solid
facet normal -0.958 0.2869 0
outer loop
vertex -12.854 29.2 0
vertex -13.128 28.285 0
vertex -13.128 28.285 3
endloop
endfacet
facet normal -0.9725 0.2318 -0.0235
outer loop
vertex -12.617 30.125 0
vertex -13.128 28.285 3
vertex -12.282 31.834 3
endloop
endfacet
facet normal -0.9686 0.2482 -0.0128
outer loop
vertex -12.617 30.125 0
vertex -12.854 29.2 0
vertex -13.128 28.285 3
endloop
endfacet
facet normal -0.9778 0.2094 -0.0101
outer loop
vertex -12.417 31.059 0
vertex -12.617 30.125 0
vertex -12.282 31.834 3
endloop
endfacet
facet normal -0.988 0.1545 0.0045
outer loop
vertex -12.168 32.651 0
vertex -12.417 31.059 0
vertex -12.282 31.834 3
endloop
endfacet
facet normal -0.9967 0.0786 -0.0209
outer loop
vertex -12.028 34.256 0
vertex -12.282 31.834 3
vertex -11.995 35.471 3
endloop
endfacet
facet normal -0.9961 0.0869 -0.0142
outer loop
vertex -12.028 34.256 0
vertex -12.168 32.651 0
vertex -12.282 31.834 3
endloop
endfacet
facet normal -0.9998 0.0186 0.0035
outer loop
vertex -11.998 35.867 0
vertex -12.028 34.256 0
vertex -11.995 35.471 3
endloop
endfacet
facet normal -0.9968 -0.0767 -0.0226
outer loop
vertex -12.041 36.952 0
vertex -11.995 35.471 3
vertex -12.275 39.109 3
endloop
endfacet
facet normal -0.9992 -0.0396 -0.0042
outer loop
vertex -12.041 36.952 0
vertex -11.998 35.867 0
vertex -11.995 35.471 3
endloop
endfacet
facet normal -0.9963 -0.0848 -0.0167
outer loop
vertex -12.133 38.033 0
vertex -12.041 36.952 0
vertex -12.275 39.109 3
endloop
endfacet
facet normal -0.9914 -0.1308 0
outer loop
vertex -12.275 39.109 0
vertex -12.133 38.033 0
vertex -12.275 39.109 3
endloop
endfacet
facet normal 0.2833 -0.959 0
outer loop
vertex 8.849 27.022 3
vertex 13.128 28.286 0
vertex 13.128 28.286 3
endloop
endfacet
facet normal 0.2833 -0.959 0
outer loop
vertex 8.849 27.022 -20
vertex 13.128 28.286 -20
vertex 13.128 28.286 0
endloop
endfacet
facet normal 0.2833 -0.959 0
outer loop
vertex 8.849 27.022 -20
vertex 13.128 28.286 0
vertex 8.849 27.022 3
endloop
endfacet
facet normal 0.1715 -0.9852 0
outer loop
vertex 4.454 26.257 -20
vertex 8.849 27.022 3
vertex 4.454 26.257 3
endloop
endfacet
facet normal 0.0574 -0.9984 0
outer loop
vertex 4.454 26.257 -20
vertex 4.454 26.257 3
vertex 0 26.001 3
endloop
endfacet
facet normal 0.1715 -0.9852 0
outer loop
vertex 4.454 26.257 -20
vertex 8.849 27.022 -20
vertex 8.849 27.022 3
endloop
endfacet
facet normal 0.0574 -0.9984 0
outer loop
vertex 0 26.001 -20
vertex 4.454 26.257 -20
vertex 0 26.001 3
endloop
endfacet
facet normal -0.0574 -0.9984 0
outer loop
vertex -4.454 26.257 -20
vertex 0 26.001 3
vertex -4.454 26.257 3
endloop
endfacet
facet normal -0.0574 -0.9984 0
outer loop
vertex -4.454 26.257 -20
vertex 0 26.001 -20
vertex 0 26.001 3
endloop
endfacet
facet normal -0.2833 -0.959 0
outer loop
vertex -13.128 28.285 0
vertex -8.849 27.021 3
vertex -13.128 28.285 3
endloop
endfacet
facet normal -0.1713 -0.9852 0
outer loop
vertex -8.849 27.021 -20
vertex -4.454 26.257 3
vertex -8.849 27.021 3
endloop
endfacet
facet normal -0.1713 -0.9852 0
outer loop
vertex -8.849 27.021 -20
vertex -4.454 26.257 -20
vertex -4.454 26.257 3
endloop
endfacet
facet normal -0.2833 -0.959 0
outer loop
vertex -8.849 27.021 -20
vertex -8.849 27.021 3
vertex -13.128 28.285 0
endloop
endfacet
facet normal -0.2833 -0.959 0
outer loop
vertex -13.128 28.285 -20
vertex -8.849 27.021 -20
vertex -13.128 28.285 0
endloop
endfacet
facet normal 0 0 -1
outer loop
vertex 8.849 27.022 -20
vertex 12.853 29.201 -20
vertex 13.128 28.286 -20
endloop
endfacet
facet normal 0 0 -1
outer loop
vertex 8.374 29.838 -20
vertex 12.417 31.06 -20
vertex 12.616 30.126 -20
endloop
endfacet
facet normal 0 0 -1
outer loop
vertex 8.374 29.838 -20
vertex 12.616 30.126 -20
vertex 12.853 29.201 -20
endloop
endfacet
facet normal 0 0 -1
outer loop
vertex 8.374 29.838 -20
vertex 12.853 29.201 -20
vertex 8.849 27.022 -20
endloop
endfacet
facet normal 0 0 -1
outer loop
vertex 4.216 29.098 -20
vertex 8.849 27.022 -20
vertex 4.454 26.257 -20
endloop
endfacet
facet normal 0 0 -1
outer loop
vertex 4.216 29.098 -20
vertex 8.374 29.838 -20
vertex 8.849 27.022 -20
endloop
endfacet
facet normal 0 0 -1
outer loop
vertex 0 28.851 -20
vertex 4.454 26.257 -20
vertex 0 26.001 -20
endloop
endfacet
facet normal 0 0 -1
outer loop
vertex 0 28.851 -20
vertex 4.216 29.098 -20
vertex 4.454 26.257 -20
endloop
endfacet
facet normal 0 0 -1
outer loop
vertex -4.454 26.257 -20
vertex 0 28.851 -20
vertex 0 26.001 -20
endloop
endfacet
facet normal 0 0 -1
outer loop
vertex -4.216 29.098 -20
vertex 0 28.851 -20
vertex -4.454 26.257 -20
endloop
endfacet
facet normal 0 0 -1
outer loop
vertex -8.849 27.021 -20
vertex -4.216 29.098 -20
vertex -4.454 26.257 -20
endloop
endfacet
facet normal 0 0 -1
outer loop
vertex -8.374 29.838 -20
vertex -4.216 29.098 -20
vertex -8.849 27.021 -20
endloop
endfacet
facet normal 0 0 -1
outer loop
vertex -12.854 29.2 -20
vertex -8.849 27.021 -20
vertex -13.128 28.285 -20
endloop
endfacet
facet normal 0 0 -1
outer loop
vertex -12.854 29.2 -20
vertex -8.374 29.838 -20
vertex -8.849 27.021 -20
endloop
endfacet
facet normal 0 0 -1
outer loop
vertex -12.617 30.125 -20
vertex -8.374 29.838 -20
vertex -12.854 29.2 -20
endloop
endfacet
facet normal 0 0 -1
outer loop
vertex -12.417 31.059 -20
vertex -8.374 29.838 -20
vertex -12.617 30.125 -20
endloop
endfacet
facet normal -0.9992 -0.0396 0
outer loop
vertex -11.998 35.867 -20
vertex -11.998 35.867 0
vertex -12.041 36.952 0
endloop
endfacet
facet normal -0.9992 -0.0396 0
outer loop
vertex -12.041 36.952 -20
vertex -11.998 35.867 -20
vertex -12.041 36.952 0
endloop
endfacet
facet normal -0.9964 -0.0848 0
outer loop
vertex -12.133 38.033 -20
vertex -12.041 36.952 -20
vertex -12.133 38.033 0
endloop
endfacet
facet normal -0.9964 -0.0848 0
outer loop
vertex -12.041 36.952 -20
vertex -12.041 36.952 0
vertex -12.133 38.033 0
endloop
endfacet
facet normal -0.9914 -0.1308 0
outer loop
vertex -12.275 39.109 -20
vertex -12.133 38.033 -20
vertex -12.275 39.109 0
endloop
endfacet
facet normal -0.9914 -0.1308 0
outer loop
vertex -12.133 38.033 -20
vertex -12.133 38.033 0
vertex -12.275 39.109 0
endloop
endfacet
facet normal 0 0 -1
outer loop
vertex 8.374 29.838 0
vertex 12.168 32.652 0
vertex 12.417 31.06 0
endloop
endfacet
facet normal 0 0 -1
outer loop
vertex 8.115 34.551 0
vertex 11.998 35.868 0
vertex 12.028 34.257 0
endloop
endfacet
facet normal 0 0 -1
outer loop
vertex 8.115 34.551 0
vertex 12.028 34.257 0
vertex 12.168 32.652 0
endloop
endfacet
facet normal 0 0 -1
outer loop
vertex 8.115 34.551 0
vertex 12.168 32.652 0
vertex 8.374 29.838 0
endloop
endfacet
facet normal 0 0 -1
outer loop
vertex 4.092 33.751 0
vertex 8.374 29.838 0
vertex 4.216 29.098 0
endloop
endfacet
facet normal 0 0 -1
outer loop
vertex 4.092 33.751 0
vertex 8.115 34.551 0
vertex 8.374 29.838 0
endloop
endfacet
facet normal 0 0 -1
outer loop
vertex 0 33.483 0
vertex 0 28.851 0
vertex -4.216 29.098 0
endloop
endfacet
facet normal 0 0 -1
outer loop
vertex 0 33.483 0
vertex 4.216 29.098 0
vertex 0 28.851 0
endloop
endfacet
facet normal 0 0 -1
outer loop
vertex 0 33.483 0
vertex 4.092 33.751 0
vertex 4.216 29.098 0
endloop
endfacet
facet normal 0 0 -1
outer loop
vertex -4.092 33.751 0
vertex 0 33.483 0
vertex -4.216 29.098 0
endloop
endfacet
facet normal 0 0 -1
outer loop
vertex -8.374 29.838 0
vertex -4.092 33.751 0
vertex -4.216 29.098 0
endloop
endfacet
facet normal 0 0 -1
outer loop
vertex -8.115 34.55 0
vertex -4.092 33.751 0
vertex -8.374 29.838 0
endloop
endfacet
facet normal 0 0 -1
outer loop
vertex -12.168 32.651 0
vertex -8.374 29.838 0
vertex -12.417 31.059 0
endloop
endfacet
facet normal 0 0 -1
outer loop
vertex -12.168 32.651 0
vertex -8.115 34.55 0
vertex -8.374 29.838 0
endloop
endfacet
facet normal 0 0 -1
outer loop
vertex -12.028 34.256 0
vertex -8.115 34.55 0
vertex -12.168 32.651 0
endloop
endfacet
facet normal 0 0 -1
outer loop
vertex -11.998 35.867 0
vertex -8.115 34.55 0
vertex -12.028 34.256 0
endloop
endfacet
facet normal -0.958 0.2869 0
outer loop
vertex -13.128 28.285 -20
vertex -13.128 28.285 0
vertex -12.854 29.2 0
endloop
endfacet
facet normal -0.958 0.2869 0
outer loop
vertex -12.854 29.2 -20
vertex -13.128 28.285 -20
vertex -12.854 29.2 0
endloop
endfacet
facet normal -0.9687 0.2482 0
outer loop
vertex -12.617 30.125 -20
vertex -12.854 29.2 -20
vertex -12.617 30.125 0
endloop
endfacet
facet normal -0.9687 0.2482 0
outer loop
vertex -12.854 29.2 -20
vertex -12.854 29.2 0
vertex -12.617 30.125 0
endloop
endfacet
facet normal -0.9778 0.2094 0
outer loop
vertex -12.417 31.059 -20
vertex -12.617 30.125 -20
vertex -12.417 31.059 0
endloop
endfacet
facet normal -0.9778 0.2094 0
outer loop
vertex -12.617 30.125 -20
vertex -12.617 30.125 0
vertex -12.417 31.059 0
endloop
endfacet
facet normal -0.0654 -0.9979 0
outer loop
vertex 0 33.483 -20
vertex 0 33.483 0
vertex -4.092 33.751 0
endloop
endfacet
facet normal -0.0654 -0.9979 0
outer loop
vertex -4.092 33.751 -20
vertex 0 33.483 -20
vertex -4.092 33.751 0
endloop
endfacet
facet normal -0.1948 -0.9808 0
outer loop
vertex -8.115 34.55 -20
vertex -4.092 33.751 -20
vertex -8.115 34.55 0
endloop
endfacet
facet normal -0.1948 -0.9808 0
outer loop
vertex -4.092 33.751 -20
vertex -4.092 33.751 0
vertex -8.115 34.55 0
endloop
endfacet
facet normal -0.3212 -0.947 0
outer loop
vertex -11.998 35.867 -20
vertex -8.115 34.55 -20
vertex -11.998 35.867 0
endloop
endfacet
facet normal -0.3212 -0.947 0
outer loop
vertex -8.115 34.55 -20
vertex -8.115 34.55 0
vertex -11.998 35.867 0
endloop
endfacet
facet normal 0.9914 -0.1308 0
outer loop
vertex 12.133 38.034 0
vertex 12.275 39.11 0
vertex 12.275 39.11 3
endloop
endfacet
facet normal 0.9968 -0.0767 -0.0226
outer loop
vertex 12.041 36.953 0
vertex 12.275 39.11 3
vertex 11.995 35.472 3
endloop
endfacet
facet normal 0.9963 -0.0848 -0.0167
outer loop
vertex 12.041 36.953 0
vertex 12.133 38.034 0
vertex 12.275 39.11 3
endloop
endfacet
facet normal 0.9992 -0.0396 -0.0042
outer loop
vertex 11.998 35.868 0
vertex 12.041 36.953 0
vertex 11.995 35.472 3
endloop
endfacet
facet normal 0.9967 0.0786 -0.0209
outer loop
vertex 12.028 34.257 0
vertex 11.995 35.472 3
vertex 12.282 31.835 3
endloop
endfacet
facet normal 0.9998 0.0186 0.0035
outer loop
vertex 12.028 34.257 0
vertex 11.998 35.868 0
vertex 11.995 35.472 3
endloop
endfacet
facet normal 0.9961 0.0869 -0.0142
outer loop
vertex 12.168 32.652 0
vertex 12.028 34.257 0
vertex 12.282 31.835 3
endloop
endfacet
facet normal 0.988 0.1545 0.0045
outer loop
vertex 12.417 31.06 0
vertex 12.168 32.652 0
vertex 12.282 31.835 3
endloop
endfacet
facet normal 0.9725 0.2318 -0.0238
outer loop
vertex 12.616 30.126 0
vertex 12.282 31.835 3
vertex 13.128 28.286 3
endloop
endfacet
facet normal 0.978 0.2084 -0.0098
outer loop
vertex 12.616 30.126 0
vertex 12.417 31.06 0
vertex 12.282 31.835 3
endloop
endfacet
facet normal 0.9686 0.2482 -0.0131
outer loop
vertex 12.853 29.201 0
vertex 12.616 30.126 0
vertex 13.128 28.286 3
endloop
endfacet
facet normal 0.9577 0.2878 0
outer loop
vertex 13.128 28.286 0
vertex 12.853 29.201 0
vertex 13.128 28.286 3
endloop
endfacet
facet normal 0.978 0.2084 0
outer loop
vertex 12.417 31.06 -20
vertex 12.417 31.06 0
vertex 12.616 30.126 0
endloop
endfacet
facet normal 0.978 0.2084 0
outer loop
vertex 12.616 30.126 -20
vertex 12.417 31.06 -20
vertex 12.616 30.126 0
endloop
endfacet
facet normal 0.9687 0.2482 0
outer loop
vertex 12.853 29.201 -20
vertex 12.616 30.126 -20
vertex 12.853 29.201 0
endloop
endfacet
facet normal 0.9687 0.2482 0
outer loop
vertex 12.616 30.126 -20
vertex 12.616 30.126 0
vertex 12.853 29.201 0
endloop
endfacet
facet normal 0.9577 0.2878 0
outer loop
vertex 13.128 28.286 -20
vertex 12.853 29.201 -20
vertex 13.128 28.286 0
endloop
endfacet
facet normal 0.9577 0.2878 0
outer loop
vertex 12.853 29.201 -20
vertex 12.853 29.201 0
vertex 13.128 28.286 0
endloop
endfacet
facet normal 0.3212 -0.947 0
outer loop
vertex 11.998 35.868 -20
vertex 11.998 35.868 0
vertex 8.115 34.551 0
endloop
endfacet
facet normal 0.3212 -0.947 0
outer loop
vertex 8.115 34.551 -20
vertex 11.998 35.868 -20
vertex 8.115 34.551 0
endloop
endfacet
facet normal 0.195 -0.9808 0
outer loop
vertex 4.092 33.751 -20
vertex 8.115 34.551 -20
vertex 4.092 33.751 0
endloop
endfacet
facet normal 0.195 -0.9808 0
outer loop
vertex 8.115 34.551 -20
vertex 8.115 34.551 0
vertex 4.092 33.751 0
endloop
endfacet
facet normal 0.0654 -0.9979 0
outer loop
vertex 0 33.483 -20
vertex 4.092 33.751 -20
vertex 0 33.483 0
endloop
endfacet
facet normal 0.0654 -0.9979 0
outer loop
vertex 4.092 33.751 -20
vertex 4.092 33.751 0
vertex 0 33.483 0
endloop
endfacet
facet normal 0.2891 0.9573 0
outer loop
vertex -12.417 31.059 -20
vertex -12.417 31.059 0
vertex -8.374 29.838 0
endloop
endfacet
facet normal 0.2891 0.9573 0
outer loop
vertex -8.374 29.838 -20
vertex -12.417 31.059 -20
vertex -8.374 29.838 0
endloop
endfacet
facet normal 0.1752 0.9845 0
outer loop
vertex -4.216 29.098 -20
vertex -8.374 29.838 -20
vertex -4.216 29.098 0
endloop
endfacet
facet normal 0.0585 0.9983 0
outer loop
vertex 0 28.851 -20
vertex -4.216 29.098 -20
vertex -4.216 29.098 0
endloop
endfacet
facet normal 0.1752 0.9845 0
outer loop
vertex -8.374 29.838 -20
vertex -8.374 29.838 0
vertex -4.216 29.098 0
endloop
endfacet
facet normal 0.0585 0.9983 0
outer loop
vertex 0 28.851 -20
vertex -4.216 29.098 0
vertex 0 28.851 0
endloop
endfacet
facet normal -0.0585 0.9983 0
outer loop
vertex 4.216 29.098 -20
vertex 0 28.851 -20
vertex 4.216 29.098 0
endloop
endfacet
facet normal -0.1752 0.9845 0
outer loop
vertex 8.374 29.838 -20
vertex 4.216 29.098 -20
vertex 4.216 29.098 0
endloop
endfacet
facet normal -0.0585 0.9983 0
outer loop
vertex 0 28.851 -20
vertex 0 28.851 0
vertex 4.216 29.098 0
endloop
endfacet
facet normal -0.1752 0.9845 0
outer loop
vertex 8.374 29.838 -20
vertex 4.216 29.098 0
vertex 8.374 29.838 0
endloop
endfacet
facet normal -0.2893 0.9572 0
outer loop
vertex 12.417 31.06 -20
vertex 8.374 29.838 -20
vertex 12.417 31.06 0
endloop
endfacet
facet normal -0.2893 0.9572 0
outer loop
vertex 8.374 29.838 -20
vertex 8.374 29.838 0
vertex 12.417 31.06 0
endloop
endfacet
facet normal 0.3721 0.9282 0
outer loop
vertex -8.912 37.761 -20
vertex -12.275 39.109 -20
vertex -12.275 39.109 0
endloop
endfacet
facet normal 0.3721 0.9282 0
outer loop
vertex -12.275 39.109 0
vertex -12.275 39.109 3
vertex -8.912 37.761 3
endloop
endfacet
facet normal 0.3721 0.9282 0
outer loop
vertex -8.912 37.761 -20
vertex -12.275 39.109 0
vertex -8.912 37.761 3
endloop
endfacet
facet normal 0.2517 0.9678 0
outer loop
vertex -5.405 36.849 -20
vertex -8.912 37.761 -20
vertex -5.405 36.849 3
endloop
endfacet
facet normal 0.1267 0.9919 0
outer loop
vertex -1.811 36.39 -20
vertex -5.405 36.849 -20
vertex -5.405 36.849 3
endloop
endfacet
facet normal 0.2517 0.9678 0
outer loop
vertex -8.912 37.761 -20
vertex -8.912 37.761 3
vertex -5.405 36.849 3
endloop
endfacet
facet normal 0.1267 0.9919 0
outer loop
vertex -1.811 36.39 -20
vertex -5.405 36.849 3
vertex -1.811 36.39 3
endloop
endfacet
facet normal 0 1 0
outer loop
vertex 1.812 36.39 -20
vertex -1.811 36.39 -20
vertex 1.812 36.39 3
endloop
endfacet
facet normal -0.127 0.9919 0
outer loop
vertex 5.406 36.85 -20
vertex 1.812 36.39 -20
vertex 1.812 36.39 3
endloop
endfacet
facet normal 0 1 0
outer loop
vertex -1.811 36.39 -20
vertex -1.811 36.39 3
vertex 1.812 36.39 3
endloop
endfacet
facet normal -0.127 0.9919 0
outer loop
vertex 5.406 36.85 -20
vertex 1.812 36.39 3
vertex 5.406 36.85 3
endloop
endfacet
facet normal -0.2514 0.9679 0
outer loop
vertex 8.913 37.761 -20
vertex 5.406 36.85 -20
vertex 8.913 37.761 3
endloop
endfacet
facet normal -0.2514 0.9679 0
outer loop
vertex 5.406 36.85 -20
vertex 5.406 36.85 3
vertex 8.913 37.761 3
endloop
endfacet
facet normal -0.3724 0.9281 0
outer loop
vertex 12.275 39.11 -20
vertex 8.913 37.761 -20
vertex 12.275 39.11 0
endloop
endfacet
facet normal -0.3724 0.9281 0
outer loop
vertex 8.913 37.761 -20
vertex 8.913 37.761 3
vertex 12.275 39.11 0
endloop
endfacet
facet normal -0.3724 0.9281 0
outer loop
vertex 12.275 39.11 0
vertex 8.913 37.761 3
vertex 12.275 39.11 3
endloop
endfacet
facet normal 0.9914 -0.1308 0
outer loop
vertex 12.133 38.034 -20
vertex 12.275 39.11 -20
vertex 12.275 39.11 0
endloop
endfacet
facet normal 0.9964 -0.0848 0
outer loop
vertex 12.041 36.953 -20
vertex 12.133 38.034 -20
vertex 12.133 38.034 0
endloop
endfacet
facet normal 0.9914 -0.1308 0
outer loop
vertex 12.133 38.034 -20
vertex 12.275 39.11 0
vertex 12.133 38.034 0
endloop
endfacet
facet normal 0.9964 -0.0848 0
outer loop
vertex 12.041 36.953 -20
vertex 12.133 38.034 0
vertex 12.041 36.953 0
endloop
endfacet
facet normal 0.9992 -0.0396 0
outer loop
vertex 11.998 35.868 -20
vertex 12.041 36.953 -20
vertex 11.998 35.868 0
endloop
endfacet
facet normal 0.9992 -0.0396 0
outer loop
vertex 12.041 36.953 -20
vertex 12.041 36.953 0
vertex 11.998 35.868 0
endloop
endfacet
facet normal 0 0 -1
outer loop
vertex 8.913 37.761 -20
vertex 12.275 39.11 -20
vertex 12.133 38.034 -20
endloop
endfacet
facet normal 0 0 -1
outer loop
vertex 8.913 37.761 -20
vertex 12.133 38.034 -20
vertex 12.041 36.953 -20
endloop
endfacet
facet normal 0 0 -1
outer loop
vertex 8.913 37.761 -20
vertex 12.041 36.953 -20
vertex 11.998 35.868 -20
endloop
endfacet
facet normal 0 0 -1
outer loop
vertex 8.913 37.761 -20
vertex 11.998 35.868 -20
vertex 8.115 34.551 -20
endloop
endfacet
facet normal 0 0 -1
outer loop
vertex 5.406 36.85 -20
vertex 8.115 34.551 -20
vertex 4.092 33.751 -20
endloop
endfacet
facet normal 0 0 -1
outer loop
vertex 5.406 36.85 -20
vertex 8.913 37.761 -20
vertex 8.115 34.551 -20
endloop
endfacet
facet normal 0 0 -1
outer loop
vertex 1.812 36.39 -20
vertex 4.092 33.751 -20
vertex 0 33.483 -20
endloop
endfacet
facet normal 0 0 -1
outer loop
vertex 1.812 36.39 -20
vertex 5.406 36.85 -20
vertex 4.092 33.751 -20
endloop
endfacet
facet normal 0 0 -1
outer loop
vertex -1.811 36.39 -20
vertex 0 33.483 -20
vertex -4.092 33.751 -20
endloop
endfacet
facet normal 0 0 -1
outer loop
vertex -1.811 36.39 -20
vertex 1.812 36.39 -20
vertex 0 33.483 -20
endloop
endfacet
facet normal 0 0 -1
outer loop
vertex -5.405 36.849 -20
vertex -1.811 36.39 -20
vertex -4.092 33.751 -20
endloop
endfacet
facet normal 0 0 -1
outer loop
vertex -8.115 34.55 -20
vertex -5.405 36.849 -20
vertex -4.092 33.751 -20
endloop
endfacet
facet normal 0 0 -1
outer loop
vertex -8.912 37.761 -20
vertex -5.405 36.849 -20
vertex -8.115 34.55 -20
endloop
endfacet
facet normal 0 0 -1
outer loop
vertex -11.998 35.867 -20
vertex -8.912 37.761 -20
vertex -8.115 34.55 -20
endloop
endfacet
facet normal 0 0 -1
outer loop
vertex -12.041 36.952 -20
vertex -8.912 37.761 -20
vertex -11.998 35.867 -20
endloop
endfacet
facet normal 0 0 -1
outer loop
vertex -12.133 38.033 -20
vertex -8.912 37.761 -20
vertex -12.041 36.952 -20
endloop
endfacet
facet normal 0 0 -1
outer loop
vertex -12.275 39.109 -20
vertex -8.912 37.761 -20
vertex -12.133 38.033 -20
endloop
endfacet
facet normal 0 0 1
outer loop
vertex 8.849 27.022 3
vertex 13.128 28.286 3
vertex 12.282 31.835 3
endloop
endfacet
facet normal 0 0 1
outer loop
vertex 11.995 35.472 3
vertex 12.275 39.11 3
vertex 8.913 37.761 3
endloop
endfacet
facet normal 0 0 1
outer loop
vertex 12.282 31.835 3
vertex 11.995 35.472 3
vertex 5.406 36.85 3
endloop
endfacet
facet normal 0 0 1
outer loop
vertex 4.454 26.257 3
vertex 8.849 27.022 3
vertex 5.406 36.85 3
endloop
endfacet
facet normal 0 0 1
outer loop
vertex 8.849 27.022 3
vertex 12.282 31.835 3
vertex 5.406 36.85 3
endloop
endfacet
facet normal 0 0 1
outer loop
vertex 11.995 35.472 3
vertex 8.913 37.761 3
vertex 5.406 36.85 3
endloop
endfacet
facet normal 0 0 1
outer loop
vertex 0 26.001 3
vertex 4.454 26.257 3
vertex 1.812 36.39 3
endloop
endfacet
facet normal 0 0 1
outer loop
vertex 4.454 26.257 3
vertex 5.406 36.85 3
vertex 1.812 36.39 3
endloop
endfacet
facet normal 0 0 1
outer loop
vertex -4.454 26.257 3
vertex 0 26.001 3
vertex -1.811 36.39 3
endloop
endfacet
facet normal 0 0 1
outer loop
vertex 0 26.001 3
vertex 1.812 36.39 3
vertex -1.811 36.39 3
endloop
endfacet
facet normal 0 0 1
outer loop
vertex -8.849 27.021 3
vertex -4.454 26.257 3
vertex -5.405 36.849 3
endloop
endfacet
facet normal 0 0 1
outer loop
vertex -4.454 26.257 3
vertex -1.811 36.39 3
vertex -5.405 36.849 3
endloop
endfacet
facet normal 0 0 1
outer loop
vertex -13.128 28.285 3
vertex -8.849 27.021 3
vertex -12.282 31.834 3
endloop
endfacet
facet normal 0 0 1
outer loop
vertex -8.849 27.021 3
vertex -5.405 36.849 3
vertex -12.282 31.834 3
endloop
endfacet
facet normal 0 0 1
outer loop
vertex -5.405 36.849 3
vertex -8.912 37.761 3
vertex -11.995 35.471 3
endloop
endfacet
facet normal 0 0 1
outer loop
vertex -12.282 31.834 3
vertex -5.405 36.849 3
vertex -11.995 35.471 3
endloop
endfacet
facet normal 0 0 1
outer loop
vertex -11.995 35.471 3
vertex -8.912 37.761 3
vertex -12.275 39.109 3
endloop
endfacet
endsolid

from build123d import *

# Parameters (mm, degrees)
BOSS_EXTRUDE1_DEPTH = 3
BOSS_EXTRUDE2_DEPTH = 20


with BuildPart() as part:
    # Sketch1 → Boss-Extrude1 (new body)
    with BuildSketch(Plane.XY):
        with BuildLine():
            ThreePointArc((12.275451386, 39.110148544), (12.067880772, 33.648168724), (13.127719813, 28.28598164))
            ThreePointArc((13.127719813, 28.28598164), (-5.7809e-05, 26.00056132), (-13.127971261, 28.285201272))
            ThreePointArc((-13.127971261, 28.285201272), (-12.06796259, 33.647129894), (-12.275256819, 39.10889939))
            ThreePointArc((-12.275256819, 39.10889939), (0.000238569, 36.332719941), (12.275451386, 39.110148544))
        make_face()
    extrude(amount=BOSS_EXTRUDE1_DEPTH)

    # Sketch2 → Boss-Extrude2 (add)
    with BuildSketch(Plane(origin=(0, 0, 0), x_dir=(-1, 0, 0), z_dir=(0, 0, -1))):
        with BuildLine():
            ThreePointArc((-0.000238569, 33.482719941), (6.116423648, 34.084515432), (11.998357864, 35.867368305))
            ThreePointArc((11.998357864, 35.867368305), (12.080645356, 37.492931332), (12.275256819, 39.10889939))
            ThreePointArc((12.275256819, 39.10889939), (-0.000238569, 36.332719941), (-12.275451386, 39.110148544))
            ThreePointArc((-12.275451386, 39.110148544), (-12.080742195, 37.494064654), (-11.998373995, 35.868378864))
            ThreePointArc((-11.998373995, 35.868378864), (-6.116717522, 34.085055957), (-0.000238569, 33.482719941))
        make_face()
        with BuildLine():
            ThreePointArc((-13.127719813, 28.28598164), (5.7809e-05, 26.00056132), (13.127971261, 28.285201272))
            ThreePointArc((13.127971261, 28.285201272), (12.730383089, 29.661389101), (12.417381714, 31.059244398))
            ThreePointArc((12.417381714, 31.059244398), (5.905e-06, 28.850561321), (-12.417221823, 31.060076762))
            ThreePointArc((-12.417221823, 31.060076762), (-12.730176217, 29.662196758), (-13.127719813, 28.28598164))
        make_face()
    extrude(amount=BOSS_EXTRUDE2_DEPTH)


solid = part.part
